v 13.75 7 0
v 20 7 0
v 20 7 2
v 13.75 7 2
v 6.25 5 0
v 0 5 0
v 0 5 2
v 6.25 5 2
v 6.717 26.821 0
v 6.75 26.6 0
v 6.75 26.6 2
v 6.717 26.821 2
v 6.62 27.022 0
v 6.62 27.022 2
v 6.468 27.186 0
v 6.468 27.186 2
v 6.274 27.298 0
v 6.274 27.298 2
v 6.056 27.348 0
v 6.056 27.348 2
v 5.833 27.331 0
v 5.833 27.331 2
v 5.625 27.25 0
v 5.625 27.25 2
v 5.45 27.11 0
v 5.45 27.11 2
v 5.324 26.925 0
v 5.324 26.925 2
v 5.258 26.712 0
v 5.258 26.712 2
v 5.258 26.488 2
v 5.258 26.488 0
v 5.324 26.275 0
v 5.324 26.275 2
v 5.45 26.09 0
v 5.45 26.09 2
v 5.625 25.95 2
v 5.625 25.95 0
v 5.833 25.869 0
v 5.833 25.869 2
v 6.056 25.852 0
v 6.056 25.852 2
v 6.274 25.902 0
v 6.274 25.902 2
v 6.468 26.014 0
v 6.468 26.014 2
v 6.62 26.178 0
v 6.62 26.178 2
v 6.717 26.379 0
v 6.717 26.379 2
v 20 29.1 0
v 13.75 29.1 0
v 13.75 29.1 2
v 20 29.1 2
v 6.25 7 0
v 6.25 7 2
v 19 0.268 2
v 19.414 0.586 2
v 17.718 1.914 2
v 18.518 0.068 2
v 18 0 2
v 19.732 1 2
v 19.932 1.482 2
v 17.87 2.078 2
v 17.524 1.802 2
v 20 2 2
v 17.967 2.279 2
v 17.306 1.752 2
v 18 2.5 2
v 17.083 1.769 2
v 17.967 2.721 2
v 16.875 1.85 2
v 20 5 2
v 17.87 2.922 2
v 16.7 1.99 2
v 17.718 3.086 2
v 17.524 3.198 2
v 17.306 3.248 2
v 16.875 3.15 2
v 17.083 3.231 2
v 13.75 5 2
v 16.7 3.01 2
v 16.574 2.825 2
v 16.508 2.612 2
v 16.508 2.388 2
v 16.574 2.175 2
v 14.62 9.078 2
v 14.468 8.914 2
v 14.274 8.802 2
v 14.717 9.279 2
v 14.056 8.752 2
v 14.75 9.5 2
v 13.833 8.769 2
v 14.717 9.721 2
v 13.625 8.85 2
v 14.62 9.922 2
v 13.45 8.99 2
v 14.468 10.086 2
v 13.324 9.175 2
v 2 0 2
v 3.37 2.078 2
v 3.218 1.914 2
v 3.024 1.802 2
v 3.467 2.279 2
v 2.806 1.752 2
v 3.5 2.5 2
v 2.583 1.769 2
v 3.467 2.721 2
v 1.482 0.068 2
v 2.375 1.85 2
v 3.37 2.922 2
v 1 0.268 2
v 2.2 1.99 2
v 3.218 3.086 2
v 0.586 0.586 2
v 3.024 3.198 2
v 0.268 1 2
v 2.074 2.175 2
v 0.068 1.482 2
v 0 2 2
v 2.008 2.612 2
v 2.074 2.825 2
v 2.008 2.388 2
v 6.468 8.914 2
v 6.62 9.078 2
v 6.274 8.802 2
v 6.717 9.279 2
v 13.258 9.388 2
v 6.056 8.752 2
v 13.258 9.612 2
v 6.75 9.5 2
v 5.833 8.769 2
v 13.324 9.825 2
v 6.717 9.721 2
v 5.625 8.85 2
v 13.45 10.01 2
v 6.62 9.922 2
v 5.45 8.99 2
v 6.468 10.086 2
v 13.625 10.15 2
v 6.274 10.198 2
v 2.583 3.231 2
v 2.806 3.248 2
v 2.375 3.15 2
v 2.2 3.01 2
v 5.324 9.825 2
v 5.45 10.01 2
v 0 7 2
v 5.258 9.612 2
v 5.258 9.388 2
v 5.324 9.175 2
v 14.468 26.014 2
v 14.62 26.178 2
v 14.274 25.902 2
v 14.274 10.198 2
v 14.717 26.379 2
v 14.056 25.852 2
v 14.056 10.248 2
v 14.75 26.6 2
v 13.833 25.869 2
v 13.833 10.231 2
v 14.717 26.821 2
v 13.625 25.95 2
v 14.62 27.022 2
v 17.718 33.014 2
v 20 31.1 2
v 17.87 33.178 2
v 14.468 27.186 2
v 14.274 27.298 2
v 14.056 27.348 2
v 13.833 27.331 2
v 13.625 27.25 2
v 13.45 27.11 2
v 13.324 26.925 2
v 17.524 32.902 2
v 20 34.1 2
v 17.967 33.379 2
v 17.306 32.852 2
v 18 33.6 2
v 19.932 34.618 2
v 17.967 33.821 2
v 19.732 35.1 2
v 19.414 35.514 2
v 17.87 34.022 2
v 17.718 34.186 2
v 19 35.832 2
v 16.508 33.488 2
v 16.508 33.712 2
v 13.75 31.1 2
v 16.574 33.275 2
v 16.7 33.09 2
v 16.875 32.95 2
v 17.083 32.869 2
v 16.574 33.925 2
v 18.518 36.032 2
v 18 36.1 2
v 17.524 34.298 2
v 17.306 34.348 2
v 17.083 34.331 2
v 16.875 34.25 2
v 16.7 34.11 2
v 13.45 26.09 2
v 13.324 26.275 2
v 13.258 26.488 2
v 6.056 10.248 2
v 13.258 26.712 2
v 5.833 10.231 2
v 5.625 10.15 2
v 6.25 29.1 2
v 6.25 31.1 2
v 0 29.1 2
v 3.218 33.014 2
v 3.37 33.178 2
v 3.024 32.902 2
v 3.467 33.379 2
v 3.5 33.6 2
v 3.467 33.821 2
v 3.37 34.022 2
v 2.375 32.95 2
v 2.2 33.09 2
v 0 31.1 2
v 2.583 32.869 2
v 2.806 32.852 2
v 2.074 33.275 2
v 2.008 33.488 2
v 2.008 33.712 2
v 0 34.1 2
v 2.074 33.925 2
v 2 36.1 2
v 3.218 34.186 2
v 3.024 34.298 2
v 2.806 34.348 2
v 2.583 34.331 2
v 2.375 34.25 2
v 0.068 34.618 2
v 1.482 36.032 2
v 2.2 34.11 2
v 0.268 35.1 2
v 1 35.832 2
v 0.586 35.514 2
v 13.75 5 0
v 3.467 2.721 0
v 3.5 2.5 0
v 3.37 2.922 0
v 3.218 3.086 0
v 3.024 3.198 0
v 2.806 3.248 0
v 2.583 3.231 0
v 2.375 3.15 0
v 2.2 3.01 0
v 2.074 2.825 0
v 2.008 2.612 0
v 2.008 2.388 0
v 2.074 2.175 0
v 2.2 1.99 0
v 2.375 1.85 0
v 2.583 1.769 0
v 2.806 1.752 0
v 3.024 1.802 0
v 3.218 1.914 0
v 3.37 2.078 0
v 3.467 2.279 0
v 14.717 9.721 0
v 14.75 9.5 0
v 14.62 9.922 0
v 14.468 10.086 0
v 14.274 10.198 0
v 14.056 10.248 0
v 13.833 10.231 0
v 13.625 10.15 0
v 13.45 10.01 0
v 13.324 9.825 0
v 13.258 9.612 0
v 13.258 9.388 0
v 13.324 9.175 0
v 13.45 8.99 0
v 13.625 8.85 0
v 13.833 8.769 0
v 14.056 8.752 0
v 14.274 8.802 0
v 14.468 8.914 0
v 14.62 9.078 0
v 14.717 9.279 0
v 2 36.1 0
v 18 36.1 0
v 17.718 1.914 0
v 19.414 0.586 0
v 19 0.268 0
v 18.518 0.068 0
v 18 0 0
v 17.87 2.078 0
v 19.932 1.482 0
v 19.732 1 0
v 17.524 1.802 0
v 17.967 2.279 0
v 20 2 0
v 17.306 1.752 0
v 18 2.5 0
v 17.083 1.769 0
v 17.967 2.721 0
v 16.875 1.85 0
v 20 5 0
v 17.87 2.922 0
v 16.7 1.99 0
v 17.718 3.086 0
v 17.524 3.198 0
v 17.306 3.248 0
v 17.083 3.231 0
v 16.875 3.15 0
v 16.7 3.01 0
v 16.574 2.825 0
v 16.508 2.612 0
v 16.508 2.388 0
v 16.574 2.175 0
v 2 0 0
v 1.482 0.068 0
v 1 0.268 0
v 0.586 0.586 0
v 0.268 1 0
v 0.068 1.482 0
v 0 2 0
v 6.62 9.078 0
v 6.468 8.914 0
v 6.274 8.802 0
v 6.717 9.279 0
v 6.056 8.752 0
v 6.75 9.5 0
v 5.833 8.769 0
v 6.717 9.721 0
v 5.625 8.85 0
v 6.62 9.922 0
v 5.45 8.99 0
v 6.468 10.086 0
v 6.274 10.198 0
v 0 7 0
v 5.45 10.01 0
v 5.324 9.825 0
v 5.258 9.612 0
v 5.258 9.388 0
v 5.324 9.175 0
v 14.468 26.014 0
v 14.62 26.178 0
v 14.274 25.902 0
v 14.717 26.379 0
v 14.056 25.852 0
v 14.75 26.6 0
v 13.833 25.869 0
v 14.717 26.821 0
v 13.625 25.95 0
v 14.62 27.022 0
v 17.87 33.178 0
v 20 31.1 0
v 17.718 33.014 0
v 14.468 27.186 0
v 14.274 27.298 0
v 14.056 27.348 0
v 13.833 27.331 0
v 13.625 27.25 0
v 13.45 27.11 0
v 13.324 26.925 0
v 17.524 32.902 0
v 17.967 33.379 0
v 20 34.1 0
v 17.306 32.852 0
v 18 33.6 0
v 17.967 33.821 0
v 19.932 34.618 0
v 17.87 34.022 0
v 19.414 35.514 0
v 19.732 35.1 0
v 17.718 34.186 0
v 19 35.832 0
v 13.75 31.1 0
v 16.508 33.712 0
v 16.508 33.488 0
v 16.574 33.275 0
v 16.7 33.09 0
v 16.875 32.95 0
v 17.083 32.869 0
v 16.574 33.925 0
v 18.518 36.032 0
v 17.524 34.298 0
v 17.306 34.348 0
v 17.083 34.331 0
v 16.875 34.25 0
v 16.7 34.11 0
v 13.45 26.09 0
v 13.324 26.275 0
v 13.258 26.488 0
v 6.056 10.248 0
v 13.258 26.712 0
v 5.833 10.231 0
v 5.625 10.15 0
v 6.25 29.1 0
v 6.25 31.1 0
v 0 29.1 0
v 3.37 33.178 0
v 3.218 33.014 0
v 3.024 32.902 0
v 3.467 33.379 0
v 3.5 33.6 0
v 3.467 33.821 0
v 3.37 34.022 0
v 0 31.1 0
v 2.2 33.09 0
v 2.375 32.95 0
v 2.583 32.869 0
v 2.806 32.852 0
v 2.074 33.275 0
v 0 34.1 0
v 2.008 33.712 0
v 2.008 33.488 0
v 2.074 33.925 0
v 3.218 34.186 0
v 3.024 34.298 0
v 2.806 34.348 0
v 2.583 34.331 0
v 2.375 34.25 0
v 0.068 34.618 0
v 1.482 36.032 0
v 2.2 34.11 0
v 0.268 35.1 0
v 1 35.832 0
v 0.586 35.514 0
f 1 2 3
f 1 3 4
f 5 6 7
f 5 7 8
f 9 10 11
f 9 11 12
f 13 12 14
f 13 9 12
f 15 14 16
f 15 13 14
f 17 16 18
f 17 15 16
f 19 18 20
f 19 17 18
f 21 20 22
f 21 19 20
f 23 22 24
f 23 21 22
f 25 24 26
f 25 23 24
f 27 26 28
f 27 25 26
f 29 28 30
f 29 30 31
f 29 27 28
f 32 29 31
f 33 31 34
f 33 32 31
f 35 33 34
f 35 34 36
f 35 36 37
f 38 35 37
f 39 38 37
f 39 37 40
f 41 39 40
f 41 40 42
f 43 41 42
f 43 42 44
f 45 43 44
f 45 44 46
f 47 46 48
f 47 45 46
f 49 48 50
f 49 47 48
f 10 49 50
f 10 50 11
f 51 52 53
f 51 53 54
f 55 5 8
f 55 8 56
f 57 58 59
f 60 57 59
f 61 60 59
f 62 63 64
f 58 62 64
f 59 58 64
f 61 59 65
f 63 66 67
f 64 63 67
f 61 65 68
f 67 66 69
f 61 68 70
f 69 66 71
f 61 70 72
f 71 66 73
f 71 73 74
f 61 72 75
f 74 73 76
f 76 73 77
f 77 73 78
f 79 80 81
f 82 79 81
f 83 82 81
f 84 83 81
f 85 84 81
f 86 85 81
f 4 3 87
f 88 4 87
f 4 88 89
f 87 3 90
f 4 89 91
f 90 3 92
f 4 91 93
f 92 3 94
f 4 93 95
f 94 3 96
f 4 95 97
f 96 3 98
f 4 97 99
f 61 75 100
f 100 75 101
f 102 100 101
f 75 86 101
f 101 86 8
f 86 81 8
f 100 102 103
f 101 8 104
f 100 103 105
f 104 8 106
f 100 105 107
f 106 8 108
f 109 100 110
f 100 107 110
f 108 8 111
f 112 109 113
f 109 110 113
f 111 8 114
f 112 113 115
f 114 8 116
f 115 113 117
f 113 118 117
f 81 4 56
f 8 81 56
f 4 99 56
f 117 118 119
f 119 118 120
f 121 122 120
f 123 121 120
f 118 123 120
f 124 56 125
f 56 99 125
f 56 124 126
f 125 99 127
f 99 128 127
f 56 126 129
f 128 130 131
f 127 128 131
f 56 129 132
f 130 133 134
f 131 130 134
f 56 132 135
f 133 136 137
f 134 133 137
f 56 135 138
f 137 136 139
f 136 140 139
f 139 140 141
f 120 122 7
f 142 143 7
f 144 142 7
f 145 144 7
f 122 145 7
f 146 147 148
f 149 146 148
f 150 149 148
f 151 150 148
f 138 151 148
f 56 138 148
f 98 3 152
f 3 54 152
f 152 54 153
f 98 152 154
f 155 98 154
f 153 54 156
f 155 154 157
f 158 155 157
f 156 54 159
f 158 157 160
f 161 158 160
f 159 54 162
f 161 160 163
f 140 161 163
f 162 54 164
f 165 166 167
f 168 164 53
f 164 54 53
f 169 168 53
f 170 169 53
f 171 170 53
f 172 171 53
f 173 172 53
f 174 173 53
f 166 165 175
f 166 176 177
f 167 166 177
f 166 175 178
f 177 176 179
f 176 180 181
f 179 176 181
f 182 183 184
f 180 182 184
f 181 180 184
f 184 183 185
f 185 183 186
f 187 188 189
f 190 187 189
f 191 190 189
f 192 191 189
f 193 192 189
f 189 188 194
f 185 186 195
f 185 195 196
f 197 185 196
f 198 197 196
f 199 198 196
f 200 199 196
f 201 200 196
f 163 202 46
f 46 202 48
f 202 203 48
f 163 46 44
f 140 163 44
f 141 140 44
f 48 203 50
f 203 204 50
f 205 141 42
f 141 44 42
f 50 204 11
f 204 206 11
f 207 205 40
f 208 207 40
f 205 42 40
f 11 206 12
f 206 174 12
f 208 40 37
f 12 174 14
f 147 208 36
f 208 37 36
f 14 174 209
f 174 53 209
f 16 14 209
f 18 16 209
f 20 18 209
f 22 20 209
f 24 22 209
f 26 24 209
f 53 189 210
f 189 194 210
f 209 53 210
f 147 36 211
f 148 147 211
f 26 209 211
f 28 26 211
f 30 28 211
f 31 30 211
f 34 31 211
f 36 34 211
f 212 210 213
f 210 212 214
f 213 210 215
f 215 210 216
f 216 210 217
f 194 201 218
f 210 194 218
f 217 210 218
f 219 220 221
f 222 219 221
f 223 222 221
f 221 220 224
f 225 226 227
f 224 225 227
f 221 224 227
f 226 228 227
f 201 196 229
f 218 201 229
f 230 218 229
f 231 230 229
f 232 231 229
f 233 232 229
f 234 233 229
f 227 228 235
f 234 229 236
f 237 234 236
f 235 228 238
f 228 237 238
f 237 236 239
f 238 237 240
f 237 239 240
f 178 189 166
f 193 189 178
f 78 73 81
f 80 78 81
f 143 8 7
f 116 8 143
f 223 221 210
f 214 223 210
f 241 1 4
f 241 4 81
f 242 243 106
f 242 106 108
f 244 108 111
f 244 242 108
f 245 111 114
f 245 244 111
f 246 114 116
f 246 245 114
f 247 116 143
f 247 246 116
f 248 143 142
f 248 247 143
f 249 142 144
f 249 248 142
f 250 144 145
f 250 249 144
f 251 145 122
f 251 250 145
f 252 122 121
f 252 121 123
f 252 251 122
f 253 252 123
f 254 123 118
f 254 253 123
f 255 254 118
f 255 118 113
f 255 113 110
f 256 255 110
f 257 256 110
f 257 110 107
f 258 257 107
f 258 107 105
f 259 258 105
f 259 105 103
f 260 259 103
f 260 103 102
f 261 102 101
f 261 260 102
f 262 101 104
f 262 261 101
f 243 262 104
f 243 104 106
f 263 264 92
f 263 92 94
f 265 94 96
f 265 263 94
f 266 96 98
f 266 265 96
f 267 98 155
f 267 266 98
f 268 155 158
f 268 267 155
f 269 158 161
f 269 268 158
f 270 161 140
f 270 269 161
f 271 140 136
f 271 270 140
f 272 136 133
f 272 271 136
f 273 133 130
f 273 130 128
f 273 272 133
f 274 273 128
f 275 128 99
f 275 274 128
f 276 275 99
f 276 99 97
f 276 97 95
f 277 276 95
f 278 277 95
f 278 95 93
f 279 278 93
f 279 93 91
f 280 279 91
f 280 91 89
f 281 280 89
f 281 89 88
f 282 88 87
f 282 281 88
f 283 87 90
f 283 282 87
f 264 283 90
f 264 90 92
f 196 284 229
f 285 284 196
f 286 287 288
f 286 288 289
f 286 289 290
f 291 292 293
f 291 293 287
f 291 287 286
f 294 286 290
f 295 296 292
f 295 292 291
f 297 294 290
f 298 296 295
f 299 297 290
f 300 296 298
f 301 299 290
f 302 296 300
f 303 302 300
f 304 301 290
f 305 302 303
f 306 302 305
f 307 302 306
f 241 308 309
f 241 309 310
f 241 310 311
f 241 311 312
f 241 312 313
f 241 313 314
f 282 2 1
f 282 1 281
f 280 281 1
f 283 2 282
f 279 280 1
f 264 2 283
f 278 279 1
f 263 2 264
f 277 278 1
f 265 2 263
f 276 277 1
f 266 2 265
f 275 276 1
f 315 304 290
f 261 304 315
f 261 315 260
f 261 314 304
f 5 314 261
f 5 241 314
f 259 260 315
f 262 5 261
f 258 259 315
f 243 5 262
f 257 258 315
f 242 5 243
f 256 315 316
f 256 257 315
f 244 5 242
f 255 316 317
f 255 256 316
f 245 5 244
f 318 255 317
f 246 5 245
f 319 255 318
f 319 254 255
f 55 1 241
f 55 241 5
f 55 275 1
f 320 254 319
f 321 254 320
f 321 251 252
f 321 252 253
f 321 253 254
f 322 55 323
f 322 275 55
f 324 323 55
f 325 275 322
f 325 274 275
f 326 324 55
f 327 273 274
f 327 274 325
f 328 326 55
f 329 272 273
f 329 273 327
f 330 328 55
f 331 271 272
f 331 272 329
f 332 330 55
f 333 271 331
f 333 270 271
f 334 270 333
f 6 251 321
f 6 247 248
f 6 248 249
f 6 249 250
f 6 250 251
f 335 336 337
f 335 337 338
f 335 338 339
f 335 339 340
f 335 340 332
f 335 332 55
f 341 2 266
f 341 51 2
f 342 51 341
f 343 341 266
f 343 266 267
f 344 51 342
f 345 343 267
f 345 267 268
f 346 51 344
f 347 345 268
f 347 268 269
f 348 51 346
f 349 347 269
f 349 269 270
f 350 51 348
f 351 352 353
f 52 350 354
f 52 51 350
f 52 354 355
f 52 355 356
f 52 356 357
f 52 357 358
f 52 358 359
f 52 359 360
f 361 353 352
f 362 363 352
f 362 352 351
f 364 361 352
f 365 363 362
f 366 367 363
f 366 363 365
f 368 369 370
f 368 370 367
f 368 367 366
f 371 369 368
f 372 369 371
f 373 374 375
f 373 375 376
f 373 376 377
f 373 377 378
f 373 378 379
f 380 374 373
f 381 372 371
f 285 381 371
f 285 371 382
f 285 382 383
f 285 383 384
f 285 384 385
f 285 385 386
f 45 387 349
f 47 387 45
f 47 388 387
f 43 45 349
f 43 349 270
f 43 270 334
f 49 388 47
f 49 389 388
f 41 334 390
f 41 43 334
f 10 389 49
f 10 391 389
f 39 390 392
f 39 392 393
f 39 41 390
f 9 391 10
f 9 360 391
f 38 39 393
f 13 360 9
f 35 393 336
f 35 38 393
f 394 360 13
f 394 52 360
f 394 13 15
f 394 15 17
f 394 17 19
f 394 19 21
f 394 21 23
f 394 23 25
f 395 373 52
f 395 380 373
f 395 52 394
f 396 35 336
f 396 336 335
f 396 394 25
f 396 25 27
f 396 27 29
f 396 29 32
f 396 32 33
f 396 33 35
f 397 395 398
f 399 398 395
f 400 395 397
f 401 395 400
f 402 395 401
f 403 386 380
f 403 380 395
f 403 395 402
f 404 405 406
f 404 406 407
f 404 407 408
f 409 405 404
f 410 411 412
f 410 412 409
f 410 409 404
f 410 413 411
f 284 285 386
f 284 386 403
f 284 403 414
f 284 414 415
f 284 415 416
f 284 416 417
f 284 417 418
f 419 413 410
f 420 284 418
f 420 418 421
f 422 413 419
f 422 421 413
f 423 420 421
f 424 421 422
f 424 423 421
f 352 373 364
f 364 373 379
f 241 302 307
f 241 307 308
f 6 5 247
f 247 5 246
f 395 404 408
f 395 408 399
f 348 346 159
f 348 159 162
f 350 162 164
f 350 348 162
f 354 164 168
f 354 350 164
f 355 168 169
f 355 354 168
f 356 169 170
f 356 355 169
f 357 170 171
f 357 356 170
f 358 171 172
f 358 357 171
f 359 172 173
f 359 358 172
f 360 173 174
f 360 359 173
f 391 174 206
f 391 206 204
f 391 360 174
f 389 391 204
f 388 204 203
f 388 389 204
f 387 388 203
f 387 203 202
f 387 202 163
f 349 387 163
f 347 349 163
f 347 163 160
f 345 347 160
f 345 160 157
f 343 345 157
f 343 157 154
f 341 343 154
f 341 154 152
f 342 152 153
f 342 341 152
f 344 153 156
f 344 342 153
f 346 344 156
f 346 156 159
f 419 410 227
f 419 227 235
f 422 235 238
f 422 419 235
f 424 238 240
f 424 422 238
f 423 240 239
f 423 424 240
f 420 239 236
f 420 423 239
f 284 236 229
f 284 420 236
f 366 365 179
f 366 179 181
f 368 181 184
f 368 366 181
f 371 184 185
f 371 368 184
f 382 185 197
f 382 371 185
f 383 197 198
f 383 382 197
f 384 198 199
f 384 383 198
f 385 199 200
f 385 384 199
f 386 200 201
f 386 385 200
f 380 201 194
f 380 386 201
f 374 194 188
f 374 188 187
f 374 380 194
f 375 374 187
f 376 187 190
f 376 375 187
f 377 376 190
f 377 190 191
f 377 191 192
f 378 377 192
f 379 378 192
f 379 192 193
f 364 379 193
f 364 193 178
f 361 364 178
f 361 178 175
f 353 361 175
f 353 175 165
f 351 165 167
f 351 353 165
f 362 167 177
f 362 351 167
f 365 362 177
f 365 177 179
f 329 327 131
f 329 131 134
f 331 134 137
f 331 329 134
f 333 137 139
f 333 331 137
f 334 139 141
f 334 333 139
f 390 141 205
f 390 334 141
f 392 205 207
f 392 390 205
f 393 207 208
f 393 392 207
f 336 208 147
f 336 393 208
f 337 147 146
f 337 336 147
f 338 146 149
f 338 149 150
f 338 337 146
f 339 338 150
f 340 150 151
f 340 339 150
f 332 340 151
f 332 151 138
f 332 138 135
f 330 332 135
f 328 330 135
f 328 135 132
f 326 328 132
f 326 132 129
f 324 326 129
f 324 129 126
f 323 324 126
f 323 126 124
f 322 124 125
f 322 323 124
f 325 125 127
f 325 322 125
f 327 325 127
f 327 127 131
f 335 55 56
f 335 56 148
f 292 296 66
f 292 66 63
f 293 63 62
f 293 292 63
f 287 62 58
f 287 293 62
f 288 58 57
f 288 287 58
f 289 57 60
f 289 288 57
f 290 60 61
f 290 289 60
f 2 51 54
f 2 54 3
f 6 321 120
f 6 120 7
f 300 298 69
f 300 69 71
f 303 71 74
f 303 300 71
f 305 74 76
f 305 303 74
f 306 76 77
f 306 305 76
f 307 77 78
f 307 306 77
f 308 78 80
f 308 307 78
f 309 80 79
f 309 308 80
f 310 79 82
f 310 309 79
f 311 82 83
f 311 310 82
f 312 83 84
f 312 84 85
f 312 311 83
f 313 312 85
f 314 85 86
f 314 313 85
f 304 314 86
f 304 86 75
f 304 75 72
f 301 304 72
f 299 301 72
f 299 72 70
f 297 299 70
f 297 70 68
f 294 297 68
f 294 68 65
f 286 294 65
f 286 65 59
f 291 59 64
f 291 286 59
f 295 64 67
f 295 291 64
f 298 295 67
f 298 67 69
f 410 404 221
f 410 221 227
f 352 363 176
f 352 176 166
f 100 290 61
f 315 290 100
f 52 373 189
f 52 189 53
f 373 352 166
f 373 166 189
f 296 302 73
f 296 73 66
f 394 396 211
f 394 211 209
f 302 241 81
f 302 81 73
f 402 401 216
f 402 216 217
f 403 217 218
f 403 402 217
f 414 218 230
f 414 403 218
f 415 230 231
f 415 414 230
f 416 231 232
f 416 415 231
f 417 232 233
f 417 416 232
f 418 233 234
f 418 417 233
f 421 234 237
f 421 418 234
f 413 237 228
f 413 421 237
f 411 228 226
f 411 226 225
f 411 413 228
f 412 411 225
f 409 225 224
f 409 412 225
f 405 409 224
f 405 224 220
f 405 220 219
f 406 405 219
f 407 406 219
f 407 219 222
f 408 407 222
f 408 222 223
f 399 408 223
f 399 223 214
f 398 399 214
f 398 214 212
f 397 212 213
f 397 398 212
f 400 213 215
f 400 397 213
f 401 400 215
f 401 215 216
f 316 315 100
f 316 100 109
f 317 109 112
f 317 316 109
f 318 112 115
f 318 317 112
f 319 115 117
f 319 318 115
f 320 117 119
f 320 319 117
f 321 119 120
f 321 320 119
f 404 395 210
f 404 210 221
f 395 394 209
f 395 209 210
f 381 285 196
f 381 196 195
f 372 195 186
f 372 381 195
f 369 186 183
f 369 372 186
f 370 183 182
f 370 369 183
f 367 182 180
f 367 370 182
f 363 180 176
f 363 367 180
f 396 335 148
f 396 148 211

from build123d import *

# Parameters (mm, degrees)
MODEL_R             = 0.75
BOSS_EXTRUDE1_DEPTH = 2


with BuildPart() as part:
    # Model → Boss-Extrude1 (new body)
    with BuildSketch(Plane.XY):
        with BuildLine():
            Line((2, 36.1), (18, 36.1))
            ThreePointArc((18, 36.1), (19.414213562, 35.514213562), (20, 34.1))
            Line((20, 34.1), (20, 31.1))
            Line((20, 31.1), (13.75, 31.1))
            Line((13.75, 31.1), (13.75, 29.1))
            Line((13.75, 29.1), (20, 29.1))
            Line((20, 29.1), (20, 7))
            Line((20, 7), (13.75, 7))
            Line((13.75, 7), (13.75, 5))
            Line((13.75, 5), (20, 5))
            Line((20, 5), (20, 2))
            ThreePointArc((20, 2), (19.414213562, 0.585786438), (18, 0))
            Line((18, 0), (2, 0))
            ThreePointArc((2, 0), (0.585786438, 0.585786438), (0, 2))
            Line((0, 2), (0, 5))
            Line((0, 5), (6.25, 5))
            Line((6.25, 5), (6.25, 7))
            Line((6.25, 7), (0, 7))
            Line((0, 7), (0, 29.1))
            Line((0, 29.1), (6.25, 29.1))
            Line((6.25, 29.1), (6.25, 31.1))
            Line((6.25, 31.1), (0, 31.1))
            Line((0, 31.1), (0, 34.1))
            ThreePointArc((0, 34.1), (0.585786438, 35.514213562), (2, 36.1))
        make_face()
        with Locations((14, 26.6)):
            Circle(MODEL_R, mode=Mode.SUBTRACT)
        with Locations((6, 26.6)):
            Circle(MODEL_R, mode=Mode.SUBTRACT)
        with Locations((14, 9.5)):
            Circle(MODEL_R, mode=Mode.SUBTRACT)
        with Locations((6, 9.5)):
            Circle(MODEL_R, mode=Mode.SUBTRACT)
        with Locations((17.25, 2.5)):
            Circle(MODEL_R, mode=Mode.SUBTRACT)
        with Locations((2.75, 2.5)):
            Circle(MODEL_R, mode=Mode.SUBTRACT)
        with Locations((17.25, 33.6)):
            Circle(MODEL_R, mode=Mode.SUBTRACT)
        with Locations((2.75, 33.6)):
            Circle(MODEL_R, mode=Mode.SUBTRACT)
    extrude(amount=BOSS_EXTRUDE1_DEPTH)


solid = part.part
